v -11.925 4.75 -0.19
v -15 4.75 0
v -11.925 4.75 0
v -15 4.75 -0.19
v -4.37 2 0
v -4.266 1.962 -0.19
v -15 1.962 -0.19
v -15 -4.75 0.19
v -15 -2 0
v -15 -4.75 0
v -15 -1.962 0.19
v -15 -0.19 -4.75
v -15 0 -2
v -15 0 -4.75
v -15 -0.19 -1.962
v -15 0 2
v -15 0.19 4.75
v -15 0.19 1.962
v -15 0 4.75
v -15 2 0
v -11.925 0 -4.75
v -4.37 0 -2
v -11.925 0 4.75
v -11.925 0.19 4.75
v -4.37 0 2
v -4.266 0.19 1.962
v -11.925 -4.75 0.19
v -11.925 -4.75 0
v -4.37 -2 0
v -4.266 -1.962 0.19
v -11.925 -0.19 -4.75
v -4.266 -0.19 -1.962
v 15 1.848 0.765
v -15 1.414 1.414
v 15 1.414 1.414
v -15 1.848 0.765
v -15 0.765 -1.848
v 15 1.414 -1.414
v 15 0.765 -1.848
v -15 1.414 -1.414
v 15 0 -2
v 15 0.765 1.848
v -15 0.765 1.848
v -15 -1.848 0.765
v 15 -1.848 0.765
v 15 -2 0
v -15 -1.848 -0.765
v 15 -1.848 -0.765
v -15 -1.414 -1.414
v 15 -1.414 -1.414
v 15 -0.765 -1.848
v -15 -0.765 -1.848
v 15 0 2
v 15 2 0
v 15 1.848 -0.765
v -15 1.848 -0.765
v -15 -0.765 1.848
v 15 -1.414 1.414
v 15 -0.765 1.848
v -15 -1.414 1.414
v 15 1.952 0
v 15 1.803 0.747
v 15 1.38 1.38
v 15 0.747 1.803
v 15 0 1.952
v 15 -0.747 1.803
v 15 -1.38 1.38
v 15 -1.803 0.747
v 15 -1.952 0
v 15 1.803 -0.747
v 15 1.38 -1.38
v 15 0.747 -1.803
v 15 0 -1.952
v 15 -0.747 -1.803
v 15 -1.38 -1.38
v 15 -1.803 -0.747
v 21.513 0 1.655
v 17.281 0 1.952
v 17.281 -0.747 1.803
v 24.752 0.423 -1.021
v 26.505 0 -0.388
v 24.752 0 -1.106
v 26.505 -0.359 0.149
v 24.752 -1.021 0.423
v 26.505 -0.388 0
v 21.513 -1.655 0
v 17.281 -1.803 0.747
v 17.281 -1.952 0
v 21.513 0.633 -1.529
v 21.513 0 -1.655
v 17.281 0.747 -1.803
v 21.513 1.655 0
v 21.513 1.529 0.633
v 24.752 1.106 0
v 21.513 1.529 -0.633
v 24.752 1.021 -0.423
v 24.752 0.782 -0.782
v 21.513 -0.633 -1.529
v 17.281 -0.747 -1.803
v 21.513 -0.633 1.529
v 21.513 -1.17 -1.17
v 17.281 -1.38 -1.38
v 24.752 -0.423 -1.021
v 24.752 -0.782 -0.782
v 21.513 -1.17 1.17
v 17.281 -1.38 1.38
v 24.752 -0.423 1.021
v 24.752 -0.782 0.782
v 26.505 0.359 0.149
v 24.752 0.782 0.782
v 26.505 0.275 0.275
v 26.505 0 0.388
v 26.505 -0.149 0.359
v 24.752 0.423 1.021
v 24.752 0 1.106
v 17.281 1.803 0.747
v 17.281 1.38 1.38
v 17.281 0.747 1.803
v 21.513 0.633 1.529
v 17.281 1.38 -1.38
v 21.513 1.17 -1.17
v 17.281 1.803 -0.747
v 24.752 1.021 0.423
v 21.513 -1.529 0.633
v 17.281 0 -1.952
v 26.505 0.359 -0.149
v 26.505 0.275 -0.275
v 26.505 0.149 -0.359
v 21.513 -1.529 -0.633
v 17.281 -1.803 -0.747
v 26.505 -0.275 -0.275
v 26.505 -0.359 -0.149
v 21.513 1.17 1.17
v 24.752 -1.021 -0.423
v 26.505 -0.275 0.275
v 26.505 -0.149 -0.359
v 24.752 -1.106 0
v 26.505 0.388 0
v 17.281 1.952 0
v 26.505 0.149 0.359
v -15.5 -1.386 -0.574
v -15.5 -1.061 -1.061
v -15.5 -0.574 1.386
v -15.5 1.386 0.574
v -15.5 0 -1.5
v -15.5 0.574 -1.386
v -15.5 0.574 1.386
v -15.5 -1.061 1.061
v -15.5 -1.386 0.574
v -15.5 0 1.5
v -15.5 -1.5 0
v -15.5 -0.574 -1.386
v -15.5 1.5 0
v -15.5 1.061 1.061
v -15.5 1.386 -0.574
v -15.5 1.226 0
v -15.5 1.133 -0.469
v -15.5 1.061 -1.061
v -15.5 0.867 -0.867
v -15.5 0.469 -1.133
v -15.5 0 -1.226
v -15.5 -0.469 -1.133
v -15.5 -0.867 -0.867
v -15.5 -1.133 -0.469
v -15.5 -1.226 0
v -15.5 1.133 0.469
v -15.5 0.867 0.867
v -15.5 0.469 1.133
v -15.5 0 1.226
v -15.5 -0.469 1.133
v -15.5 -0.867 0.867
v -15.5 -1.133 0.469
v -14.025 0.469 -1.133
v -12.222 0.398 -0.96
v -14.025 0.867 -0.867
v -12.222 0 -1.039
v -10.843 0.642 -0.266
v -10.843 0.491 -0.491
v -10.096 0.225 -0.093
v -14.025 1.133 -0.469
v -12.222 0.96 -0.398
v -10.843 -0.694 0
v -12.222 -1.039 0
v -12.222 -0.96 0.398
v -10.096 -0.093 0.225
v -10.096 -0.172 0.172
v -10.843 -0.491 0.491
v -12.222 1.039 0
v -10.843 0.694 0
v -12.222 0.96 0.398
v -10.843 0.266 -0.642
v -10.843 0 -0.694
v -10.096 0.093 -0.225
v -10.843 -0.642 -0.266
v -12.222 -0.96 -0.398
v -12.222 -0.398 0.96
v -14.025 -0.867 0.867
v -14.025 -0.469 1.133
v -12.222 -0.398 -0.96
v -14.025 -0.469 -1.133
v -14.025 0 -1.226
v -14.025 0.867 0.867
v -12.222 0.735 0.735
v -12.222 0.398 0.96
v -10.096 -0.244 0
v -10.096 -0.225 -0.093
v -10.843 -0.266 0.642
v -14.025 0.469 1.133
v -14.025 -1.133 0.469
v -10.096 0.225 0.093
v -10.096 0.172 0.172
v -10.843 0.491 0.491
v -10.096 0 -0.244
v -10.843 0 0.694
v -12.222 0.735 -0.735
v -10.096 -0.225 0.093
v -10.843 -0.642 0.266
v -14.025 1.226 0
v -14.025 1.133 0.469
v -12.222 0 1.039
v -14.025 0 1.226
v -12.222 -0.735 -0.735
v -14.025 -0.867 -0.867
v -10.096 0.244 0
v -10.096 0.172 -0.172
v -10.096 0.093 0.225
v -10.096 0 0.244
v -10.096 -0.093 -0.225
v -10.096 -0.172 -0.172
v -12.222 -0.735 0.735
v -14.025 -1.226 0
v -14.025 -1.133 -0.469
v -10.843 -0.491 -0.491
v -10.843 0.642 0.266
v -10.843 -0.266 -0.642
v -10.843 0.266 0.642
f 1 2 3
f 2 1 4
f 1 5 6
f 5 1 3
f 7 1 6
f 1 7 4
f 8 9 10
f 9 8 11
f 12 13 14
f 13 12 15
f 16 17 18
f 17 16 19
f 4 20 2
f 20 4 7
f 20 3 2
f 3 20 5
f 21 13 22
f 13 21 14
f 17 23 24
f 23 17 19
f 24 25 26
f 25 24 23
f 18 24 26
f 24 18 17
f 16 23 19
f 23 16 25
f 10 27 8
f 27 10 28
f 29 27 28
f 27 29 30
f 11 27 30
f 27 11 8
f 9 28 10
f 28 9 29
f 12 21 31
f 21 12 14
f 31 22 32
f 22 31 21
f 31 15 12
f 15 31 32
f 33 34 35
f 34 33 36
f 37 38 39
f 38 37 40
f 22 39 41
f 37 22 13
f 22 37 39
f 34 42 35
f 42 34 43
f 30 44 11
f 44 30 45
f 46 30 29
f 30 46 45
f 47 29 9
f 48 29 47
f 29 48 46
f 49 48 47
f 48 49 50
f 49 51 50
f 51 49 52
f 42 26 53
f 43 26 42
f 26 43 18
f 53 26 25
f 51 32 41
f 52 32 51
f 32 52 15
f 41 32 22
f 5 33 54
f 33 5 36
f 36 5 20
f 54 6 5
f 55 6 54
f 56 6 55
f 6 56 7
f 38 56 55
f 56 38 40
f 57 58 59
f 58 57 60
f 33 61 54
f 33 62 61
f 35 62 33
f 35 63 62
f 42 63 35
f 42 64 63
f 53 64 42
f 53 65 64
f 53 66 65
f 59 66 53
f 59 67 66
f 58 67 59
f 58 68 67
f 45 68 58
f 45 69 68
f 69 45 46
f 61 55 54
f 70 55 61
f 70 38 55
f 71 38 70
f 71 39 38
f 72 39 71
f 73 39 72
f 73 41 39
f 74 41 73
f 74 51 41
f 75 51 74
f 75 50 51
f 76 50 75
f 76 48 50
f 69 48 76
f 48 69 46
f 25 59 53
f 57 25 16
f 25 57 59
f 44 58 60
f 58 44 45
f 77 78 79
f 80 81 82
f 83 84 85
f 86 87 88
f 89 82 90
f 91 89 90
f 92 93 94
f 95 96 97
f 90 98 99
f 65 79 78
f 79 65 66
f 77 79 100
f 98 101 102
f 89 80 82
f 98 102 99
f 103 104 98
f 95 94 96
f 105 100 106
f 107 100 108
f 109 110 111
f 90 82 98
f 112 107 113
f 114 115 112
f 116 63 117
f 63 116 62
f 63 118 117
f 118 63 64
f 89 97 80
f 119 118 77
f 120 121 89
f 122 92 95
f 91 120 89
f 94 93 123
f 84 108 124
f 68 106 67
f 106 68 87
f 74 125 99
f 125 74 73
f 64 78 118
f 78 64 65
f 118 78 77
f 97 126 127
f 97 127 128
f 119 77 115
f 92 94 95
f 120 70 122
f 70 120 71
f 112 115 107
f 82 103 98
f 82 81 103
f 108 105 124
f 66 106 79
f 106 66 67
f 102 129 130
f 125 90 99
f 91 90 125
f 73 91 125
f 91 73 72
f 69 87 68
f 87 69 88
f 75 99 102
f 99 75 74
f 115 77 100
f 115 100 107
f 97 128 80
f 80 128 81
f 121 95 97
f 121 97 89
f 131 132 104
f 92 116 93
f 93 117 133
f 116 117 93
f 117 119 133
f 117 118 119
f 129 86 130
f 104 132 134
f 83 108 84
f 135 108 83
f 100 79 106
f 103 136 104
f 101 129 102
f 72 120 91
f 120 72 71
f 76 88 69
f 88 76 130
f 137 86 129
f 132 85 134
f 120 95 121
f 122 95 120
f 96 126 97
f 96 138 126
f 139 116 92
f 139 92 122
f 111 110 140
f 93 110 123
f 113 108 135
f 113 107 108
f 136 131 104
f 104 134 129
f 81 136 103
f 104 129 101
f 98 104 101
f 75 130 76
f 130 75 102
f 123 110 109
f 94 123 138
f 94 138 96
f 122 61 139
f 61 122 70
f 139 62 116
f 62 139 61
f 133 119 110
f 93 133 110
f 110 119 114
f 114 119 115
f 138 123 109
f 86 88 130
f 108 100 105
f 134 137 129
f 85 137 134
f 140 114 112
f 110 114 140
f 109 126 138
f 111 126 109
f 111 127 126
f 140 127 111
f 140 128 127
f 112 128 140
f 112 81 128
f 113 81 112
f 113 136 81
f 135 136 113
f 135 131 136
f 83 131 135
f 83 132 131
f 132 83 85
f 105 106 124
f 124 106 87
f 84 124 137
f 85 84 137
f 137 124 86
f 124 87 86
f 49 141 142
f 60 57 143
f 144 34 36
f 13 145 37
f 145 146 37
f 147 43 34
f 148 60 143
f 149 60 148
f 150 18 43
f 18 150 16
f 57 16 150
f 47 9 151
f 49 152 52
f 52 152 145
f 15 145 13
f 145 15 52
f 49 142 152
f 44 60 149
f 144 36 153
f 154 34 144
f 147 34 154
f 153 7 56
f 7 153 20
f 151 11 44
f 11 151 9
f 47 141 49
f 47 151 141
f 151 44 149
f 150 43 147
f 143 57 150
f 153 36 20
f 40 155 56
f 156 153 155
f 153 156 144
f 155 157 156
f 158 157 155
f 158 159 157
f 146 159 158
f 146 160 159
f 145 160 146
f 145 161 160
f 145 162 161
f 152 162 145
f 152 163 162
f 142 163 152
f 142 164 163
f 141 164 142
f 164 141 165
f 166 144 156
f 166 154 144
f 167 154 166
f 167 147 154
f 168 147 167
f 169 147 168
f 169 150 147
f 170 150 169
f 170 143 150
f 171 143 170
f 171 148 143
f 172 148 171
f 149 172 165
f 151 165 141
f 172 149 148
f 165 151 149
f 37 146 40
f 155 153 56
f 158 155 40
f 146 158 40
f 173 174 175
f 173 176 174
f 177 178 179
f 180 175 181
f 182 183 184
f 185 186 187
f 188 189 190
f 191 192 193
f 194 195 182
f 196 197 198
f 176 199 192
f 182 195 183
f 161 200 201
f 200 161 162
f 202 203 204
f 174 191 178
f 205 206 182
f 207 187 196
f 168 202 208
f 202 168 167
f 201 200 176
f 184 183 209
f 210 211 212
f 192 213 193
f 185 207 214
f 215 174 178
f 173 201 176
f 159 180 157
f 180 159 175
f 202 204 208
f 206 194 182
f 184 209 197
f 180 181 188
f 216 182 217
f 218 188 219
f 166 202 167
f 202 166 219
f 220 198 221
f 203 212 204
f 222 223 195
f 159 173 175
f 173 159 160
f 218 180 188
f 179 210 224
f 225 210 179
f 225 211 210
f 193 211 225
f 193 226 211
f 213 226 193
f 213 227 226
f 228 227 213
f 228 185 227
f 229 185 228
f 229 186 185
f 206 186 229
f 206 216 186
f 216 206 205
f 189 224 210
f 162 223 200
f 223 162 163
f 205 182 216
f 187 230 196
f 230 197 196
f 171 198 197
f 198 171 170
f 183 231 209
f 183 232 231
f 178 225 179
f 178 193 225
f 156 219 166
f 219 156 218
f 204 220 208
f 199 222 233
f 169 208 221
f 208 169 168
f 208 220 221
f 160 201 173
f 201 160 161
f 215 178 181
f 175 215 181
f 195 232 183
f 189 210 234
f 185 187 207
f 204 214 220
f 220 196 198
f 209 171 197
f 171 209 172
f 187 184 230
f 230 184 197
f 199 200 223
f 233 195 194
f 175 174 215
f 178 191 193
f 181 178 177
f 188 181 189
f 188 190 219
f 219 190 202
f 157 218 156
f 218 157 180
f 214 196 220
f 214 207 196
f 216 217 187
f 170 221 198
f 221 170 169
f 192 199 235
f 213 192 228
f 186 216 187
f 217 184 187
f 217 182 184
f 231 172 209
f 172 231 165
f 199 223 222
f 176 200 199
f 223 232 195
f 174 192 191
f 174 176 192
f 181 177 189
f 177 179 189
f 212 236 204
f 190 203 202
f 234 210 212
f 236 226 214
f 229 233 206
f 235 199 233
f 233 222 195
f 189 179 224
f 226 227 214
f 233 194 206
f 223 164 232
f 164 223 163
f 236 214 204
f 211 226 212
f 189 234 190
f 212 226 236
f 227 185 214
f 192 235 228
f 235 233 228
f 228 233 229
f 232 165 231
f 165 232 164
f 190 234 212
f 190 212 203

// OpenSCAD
// file: imposter_thrust.scad
module half_shere() {
	difference() {
		sphere(r=1);
		translate([0,-1.5,-1.5])
			cube([3,3,3]);
	}
}
module imposter_thrust(x, y, z, scale) {
	translate([x,y,z]) {
		translate([-0.25,0,0]) {
			scale(scale) {
				union() {
					scale([4,1.4,1.4])
						half_shere();
					scale([1.4,1.4,1.4])
						rotate([0,0,180])
							half_shere();
				}
			}
		}
	}
}
// main file
$fn=16;

module missile()
{
	difference() {
		union() {
			cylinder(h = 30, r1 = 2, r2 = 2, center = true);
			translate(v = [0, 0, 14.99]) {
				scale(v = [1, 1, 5.9])
					sphere(r = 1.99);
			}
			translate(v = [0, 0, -15.5]) {
				cylinder(h = 0.5, r1 = 1.5, r2 = 2);
			}
			translate(v = [0, 0, -15])
				scale(0.95, 0.95, 0.95)
					finset();
		}
		translate(v = [0, 0, -15])
			scale(v = [0.25, 0.25, 1.0])
				sphere(r = 5);
	}
}

module fin()
{
	difference() {
		cube(size = [0.2, 10, 20]);
		union() {
			translate(v = [0, 10, 0])
				cube(size = [10, 10, 20], center = true);
			translate(v = [0, 15, 5])
				rotate(v = [1, 0, 0], a = 20)
					cube(size = [10, 20, 40], center = true);
		}
	}
}

module finset()
{
	for (i = [0:90:270])
		rotate(v = [0, 0, 1], i)
			fin();
}

rotate(v = [0, 1, 0], a = 90)
	missile();

use <imposter_thrust.scad>;
thrust_ports = 0;
if (thrust_ports) {
	imposter_thrust(-18, 0, 0, 1.6);
}
